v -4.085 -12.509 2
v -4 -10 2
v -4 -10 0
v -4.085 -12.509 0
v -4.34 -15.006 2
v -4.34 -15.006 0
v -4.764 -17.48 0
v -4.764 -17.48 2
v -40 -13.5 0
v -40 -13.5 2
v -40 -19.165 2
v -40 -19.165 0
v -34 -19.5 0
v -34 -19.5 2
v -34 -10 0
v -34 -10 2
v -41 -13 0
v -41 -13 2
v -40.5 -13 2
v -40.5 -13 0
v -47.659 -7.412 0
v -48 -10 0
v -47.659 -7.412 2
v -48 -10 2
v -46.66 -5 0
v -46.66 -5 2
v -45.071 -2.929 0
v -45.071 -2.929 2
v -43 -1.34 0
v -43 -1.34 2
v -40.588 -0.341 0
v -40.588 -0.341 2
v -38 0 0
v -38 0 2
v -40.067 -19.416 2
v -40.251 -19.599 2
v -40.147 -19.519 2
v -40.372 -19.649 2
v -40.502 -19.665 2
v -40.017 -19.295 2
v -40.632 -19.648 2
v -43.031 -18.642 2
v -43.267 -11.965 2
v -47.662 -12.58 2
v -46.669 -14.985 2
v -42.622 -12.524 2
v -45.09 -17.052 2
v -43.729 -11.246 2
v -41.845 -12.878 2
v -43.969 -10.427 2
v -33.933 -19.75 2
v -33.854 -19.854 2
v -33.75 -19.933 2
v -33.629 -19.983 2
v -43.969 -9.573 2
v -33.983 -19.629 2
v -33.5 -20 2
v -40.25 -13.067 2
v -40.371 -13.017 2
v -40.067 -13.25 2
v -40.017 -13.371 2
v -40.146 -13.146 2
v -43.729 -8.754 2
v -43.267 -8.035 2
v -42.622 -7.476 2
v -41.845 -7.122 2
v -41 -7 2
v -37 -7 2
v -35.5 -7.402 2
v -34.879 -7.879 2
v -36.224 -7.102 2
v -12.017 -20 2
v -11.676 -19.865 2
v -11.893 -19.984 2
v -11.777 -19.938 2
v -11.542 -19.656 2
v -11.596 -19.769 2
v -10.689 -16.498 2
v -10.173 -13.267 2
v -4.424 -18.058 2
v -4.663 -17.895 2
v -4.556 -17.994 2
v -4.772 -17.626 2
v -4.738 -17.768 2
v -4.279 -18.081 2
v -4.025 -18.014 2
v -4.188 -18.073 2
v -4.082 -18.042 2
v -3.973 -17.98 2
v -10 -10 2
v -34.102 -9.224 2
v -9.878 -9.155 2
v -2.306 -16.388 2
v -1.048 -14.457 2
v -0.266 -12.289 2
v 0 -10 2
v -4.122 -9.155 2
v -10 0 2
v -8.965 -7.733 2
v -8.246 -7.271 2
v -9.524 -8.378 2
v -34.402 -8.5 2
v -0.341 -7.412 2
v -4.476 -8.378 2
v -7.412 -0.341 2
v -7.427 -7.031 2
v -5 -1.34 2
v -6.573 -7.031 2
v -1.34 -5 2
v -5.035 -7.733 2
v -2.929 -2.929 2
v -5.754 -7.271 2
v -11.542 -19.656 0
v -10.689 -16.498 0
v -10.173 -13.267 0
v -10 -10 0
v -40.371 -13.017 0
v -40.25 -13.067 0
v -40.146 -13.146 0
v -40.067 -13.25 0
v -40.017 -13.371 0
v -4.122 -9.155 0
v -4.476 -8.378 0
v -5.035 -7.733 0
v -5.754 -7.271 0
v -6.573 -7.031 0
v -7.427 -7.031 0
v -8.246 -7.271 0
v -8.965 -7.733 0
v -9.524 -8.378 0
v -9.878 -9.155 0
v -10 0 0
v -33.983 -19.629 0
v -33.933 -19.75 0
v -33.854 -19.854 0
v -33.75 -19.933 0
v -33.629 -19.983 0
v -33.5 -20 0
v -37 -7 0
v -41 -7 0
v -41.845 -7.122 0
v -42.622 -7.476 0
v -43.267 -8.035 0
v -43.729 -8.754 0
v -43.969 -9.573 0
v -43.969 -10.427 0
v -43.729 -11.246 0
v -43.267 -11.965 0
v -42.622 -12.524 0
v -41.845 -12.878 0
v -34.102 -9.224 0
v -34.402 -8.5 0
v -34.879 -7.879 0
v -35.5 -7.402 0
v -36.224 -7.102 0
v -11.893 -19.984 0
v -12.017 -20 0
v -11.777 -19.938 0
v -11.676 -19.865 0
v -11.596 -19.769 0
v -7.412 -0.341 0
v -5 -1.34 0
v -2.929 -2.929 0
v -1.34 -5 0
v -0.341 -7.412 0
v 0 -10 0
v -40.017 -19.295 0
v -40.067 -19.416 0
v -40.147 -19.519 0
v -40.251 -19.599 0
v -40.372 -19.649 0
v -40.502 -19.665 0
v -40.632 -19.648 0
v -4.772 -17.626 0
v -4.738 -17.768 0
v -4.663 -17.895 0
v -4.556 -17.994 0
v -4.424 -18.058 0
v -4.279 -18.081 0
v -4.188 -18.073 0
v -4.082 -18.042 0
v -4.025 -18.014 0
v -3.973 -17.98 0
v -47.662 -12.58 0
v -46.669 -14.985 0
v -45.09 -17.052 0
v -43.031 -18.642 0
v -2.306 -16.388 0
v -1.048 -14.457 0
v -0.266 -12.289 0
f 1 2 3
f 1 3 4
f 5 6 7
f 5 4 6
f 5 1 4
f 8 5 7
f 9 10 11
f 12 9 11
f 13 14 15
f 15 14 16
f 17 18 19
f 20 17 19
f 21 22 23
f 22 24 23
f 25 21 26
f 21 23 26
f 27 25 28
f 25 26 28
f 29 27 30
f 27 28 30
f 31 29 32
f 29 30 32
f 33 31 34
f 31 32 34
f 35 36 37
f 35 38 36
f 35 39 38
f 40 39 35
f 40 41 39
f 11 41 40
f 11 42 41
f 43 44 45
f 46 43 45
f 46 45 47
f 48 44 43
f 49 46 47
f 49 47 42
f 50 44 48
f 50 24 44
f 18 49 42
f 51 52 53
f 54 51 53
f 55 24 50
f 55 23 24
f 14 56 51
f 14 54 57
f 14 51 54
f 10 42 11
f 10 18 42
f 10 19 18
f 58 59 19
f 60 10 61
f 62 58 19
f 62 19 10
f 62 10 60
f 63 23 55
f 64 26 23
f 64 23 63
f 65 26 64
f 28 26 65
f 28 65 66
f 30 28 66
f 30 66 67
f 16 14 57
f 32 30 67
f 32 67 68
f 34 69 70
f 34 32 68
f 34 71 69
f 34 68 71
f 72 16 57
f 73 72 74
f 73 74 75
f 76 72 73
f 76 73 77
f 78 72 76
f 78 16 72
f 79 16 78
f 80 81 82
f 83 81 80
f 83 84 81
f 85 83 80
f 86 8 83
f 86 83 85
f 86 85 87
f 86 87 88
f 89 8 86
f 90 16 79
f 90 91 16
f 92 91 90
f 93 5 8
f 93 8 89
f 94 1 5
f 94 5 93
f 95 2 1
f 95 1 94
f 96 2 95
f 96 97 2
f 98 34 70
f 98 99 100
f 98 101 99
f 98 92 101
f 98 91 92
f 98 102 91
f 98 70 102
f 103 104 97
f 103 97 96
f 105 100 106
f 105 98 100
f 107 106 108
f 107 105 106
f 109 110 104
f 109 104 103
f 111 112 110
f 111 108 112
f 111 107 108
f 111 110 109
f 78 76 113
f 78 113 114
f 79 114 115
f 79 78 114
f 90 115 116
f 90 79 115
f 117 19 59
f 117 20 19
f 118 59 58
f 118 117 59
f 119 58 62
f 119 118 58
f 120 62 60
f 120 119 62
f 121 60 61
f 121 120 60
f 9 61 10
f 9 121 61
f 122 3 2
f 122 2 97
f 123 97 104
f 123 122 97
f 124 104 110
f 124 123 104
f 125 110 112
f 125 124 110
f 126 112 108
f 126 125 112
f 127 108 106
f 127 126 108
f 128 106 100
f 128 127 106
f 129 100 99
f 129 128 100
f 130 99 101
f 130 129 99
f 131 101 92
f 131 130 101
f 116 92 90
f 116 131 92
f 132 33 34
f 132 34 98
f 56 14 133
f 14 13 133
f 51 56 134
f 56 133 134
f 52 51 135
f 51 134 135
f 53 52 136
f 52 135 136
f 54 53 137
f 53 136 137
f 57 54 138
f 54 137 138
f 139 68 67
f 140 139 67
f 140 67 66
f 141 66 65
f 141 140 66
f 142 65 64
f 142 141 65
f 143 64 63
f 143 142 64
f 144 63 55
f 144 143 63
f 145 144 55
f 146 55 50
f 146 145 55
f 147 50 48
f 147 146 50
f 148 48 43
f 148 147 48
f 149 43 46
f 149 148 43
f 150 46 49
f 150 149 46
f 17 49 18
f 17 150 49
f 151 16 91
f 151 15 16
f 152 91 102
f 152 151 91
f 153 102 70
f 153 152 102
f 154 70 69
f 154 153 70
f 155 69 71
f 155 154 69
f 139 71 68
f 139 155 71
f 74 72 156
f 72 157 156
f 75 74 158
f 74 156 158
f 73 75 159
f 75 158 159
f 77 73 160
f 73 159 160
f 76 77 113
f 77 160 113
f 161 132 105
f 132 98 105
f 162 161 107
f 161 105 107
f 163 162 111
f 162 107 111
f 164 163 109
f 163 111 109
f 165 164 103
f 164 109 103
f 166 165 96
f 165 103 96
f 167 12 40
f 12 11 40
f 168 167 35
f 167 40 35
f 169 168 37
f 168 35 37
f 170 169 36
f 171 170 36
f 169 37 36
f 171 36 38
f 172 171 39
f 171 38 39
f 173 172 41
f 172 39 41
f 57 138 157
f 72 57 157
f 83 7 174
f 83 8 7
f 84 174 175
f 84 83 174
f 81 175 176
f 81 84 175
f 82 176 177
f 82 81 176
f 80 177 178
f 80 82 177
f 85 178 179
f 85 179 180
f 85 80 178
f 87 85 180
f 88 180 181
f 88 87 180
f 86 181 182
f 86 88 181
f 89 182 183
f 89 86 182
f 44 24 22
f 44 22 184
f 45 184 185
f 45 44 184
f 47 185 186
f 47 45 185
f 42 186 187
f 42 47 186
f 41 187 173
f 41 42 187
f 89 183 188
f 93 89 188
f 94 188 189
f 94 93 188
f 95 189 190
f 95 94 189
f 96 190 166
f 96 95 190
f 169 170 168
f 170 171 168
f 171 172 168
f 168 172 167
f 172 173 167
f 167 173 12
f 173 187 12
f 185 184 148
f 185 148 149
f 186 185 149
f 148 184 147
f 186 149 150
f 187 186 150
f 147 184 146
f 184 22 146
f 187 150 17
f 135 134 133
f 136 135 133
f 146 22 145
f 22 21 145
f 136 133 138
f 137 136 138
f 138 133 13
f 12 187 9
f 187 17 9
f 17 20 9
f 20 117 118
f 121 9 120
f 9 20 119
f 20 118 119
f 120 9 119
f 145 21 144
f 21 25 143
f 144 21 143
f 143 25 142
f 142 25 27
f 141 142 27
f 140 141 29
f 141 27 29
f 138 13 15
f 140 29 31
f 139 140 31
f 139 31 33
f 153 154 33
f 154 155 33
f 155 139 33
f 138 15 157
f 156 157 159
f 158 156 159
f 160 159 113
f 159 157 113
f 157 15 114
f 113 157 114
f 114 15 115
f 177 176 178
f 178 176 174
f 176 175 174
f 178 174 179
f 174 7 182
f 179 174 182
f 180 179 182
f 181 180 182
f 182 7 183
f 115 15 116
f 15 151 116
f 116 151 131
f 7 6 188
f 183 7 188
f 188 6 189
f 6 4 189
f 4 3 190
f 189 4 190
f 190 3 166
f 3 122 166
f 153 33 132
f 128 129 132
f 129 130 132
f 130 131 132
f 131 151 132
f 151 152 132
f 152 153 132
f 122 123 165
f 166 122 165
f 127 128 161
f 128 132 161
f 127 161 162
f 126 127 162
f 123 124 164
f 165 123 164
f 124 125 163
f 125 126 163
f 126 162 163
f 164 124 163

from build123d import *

# Parameters (mm, degrees)
SZKIC1_W                    = 48
SZKIC1_H                    = 20
SZKIC1_R                    = 3
DODANIE_WYCI_GNI_CIE2_DEPTH = 2
ZAOKR_GLENIE3_R             = 10
WYTNIJ_WYCI_GNI_CIE1_DEPTH  = 53.038447325
ZAOKR_GLENIE1_R             = 3
ZAOKR_GLENIE2_R             = 0.5


with BuildPart() as part:
    # Szkic1 → Dodanie-wyciągnięcie2 (new body)
    with BuildSketch(Plane.XY):
        with Locations((-24, -10)):
            Rectangle(SZKIC1_W, SZKIC1_H)
        with Locations((-7, -10)):
            Circle(SZKIC1_R, mode=Mode.SUBTRACT)
        with Locations((-41, -10)):
            Circle(SZKIC1_R, mode=Mode.SUBTRACT)
    extrude(amount=DODANIE_WYCI_GNI_CIE2_DEPTH)

    # Zaokrąglenie3
    zaokr_glenie3_edges = [part.edges().sort_by_distance(p)[0] for p in [
        (0, 0, 1),
        (0, -20, 1),
        (-48, -20, 1),
        (-48, 0, 1),
    ]]
    fillet(zaokr_glenie3_edges, radius=ZAOKR_GLENIE3_R - 0.0001)  # a hair under: the kernel refuses the full size

    # Szkic2 → Wytnij-wyciągnięcie1 (cut, through all)
    with BuildSketch(Plane.XY.offset(2)):
        with BuildLine():
            Line((-10, -10), (-4, -10))
            ThreePointArc((-4, -10), (-4.345859909, -15.047178833), (-5.376973739, -20))
            Line((-5.376973739, -20), (-11.657198498, -20))
            ThreePointArc((-11.657198498, -20), (-10.417105708, -15.068192648), (-10, -10))
        make_face()
        Polygon((-41, -10), (-41, -13), (-40, -13), (-40, -20), (-34, -20), (-34, -17.5), (-34, -7), (-41, -7), align=None)
    extrude(amount=-WYTNIJ_WYCI_GNI_CIE1_DEPTH, mode=Mode.SUBTRACT)

    # Zaokrąglenie1
    zaokr_glenie1_edges = [part.edges().sort_by_distance(p)[0] for p in [
        (-34, -7, 1),
    ]]
    fillet(zaokr_glenie1_edges, radius=ZAOKR_GLENIE1_R)

    # Zaokrąglenie2
    zaokr_glenie2_edges = [part.edges().sort_by_distance(p)[0] for p in [
        (-40, -19.797977321, 1),
        (-5.032269828, -18.678847057, 1),
        (-34, -20, 1),
        (-40, -13, 1),
        (-11.657198498, -20, 1),
    ]]
    fillet(zaokr_glenie2_edges, radius=ZAOKR_GLENIE2_R)


solid = part.part
